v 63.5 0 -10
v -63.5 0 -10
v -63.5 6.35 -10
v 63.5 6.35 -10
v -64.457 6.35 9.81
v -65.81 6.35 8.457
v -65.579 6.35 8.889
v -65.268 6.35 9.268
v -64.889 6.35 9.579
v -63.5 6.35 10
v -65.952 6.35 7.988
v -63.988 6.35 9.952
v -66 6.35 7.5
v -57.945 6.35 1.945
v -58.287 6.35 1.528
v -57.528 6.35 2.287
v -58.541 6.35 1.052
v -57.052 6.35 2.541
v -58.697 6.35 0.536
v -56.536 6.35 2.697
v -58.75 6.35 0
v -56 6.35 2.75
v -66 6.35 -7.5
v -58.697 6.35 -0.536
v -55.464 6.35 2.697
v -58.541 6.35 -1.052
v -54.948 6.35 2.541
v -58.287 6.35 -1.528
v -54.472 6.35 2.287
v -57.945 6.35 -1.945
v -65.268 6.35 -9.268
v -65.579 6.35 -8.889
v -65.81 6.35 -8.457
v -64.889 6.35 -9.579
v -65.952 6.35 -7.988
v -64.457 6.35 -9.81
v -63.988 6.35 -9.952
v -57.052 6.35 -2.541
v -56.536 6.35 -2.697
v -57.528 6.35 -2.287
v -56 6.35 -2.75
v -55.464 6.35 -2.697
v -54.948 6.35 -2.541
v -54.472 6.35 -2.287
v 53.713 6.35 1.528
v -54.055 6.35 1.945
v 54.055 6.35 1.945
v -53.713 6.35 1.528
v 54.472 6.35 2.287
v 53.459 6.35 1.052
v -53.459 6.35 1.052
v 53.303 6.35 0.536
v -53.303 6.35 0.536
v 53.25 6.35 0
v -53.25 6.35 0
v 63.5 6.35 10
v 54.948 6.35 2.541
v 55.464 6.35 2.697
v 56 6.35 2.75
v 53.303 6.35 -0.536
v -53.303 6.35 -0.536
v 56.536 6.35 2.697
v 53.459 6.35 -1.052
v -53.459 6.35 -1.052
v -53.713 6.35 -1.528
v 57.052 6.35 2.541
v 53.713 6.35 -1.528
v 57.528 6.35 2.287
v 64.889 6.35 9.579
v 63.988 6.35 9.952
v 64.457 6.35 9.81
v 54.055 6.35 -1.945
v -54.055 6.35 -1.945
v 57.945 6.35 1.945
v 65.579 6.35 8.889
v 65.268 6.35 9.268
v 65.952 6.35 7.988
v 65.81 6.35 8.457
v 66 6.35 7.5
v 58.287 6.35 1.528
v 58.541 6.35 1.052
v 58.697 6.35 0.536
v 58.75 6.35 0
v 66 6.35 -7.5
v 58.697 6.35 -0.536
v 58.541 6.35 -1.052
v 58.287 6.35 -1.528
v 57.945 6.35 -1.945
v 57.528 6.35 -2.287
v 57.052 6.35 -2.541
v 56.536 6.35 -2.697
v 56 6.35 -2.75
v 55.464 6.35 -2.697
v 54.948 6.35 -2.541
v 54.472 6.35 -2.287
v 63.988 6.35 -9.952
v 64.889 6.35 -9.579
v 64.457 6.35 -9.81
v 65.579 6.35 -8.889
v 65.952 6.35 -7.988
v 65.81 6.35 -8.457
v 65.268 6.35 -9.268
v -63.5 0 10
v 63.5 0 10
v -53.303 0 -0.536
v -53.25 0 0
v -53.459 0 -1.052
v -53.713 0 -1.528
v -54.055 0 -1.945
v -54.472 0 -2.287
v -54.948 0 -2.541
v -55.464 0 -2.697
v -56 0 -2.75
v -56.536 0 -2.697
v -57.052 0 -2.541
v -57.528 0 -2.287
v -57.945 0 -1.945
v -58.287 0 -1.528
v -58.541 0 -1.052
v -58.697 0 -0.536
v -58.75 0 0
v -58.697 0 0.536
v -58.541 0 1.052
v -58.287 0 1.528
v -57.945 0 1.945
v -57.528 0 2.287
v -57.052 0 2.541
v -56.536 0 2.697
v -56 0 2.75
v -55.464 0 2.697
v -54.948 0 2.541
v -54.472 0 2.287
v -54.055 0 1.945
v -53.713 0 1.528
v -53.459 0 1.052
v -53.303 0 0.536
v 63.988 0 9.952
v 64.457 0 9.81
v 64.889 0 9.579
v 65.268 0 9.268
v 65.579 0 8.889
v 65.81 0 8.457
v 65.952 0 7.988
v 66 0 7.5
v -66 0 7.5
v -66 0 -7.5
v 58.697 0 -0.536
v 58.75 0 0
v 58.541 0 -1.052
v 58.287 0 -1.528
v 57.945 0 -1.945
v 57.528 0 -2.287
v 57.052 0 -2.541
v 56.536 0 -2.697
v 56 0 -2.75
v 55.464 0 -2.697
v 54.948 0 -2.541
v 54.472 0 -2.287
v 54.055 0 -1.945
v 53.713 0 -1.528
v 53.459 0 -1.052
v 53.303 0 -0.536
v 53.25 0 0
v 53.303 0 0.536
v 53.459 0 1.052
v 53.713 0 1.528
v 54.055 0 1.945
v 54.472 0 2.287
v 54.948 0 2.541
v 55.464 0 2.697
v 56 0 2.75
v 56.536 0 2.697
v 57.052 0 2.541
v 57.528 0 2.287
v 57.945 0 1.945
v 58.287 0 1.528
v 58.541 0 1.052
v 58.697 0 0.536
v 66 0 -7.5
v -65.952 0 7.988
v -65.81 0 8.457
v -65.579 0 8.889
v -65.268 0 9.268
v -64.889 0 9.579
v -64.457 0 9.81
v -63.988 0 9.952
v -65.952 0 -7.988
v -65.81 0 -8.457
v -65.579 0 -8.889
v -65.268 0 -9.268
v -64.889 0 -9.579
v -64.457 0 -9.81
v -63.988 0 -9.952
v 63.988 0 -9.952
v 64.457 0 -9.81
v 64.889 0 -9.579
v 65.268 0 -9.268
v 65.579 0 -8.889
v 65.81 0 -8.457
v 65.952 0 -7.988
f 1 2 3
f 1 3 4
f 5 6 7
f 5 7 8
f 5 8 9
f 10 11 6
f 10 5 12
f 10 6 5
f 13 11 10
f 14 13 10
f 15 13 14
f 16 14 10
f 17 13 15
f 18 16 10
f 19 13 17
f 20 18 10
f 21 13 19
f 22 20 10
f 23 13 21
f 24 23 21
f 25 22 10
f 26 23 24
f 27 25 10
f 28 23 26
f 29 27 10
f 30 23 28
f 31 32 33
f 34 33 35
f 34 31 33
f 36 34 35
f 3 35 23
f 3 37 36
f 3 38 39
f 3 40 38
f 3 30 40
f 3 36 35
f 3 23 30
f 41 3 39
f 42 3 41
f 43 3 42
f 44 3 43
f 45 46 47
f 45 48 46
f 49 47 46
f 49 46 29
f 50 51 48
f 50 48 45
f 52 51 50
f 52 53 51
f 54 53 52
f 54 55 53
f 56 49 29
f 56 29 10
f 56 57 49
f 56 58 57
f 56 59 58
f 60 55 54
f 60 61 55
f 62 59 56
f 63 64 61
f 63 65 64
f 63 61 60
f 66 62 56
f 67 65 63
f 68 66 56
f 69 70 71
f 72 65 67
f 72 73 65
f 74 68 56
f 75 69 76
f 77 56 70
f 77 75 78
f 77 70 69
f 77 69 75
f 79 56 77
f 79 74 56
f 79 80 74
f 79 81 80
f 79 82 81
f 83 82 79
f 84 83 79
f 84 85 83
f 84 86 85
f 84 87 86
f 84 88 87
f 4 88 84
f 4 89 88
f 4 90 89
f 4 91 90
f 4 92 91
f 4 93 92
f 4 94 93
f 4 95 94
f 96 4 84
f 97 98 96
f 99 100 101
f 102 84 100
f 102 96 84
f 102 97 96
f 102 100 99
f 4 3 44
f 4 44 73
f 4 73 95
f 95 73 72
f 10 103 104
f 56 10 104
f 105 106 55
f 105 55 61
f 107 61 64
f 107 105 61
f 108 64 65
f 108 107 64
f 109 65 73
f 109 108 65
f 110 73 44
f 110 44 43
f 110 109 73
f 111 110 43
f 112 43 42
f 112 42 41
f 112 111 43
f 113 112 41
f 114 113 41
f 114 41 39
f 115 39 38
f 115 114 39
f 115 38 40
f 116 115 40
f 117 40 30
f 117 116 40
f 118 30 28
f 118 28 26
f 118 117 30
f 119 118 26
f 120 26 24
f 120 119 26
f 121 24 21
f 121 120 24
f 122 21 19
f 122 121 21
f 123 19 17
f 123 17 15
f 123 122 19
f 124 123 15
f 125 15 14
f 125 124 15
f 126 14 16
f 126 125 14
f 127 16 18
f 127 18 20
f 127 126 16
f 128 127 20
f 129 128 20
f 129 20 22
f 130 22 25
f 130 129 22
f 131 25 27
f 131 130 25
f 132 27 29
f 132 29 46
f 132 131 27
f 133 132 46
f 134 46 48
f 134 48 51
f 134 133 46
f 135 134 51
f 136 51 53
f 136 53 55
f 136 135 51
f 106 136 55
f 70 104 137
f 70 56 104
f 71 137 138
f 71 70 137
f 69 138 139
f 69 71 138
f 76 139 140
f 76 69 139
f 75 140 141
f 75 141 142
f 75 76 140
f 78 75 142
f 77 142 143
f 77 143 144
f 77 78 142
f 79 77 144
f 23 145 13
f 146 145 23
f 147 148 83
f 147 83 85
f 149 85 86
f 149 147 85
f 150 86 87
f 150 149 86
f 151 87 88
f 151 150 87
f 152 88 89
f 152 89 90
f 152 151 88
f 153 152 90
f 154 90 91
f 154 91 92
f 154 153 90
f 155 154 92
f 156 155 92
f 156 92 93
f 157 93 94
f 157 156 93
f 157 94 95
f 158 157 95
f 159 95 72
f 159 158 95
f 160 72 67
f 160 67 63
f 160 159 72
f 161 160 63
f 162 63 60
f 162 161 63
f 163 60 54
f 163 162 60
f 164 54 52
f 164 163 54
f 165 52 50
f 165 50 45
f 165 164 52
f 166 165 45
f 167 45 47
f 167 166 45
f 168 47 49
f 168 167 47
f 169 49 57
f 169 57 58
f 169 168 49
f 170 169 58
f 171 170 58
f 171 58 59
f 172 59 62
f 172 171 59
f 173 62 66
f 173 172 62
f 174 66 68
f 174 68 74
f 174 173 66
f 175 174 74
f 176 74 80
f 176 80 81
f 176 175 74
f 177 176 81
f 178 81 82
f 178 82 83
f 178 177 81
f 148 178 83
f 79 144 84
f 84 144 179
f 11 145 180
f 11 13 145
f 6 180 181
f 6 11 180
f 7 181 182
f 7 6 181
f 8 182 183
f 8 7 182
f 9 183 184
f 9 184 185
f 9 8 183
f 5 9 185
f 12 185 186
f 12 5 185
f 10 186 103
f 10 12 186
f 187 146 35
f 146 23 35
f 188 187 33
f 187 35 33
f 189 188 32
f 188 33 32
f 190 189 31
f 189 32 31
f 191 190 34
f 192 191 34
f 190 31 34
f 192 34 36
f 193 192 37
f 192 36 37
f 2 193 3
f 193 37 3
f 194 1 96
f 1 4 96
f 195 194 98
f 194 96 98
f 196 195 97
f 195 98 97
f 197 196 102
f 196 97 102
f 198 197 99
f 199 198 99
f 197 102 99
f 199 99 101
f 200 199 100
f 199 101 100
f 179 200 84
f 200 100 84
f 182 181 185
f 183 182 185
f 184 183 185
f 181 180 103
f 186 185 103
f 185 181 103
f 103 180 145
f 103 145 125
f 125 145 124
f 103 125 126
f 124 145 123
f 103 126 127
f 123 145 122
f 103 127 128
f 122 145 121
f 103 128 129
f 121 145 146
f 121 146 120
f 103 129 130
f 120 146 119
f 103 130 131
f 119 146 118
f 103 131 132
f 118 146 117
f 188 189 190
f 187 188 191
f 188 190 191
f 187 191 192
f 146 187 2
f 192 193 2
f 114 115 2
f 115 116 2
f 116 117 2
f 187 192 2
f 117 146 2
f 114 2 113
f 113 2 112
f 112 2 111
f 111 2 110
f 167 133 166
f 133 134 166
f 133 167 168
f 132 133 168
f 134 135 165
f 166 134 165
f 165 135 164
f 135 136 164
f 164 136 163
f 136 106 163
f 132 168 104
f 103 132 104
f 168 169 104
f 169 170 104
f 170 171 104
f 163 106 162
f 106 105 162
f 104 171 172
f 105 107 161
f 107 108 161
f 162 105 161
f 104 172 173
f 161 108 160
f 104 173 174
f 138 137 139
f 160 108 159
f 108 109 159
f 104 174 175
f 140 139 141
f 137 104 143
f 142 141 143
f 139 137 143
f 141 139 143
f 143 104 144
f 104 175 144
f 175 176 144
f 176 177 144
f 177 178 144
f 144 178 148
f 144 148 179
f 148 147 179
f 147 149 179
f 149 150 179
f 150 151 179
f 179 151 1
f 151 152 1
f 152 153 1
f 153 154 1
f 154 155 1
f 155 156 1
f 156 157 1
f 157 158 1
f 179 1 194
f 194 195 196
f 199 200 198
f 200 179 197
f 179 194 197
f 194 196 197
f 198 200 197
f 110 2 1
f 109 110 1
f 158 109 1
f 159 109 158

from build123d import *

# Parameters (mm, degrees)
SKETCH1_W           = 132
SKETCH1_H           = 20
SKETCH1_R           = 2.75
BOSS_EXTRUDE1_DEPTH = 6.35
FILLET1_R           = 2.5


with BuildPart() as part:
    # Sketch1 → Boss-Extrude1 (new body)
    with BuildSketch(Plane(origin=(0, 0, 0), x_dir=(1, 0, 0), z_dir=(0, 1, 0))):
        Rectangle(SKETCH1_W, SKETCH1_H)
        with Locations((-56, 0)):
            Circle(SKETCH1_R, mode=Mode.SUBTRACT)
        with Locations((56, 0)):
            Circle(SKETCH1_R, mode=Mode.SUBTRACT)
    extrude(amount=BOSS_EXTRUDE1_DEPTH)

    # Fillet1
    fillet1_edges = [part.edges().sort_by_distance(p)[0] for p in [
        (-66, 3.175, -10),
        (66, 3.175, -10),
        (66, 3.175, 10),
        (-66, 3.175, 10),
    ]]
    fillet(fillet1_edges, radius=FILLET1_R)


solid = part.part
